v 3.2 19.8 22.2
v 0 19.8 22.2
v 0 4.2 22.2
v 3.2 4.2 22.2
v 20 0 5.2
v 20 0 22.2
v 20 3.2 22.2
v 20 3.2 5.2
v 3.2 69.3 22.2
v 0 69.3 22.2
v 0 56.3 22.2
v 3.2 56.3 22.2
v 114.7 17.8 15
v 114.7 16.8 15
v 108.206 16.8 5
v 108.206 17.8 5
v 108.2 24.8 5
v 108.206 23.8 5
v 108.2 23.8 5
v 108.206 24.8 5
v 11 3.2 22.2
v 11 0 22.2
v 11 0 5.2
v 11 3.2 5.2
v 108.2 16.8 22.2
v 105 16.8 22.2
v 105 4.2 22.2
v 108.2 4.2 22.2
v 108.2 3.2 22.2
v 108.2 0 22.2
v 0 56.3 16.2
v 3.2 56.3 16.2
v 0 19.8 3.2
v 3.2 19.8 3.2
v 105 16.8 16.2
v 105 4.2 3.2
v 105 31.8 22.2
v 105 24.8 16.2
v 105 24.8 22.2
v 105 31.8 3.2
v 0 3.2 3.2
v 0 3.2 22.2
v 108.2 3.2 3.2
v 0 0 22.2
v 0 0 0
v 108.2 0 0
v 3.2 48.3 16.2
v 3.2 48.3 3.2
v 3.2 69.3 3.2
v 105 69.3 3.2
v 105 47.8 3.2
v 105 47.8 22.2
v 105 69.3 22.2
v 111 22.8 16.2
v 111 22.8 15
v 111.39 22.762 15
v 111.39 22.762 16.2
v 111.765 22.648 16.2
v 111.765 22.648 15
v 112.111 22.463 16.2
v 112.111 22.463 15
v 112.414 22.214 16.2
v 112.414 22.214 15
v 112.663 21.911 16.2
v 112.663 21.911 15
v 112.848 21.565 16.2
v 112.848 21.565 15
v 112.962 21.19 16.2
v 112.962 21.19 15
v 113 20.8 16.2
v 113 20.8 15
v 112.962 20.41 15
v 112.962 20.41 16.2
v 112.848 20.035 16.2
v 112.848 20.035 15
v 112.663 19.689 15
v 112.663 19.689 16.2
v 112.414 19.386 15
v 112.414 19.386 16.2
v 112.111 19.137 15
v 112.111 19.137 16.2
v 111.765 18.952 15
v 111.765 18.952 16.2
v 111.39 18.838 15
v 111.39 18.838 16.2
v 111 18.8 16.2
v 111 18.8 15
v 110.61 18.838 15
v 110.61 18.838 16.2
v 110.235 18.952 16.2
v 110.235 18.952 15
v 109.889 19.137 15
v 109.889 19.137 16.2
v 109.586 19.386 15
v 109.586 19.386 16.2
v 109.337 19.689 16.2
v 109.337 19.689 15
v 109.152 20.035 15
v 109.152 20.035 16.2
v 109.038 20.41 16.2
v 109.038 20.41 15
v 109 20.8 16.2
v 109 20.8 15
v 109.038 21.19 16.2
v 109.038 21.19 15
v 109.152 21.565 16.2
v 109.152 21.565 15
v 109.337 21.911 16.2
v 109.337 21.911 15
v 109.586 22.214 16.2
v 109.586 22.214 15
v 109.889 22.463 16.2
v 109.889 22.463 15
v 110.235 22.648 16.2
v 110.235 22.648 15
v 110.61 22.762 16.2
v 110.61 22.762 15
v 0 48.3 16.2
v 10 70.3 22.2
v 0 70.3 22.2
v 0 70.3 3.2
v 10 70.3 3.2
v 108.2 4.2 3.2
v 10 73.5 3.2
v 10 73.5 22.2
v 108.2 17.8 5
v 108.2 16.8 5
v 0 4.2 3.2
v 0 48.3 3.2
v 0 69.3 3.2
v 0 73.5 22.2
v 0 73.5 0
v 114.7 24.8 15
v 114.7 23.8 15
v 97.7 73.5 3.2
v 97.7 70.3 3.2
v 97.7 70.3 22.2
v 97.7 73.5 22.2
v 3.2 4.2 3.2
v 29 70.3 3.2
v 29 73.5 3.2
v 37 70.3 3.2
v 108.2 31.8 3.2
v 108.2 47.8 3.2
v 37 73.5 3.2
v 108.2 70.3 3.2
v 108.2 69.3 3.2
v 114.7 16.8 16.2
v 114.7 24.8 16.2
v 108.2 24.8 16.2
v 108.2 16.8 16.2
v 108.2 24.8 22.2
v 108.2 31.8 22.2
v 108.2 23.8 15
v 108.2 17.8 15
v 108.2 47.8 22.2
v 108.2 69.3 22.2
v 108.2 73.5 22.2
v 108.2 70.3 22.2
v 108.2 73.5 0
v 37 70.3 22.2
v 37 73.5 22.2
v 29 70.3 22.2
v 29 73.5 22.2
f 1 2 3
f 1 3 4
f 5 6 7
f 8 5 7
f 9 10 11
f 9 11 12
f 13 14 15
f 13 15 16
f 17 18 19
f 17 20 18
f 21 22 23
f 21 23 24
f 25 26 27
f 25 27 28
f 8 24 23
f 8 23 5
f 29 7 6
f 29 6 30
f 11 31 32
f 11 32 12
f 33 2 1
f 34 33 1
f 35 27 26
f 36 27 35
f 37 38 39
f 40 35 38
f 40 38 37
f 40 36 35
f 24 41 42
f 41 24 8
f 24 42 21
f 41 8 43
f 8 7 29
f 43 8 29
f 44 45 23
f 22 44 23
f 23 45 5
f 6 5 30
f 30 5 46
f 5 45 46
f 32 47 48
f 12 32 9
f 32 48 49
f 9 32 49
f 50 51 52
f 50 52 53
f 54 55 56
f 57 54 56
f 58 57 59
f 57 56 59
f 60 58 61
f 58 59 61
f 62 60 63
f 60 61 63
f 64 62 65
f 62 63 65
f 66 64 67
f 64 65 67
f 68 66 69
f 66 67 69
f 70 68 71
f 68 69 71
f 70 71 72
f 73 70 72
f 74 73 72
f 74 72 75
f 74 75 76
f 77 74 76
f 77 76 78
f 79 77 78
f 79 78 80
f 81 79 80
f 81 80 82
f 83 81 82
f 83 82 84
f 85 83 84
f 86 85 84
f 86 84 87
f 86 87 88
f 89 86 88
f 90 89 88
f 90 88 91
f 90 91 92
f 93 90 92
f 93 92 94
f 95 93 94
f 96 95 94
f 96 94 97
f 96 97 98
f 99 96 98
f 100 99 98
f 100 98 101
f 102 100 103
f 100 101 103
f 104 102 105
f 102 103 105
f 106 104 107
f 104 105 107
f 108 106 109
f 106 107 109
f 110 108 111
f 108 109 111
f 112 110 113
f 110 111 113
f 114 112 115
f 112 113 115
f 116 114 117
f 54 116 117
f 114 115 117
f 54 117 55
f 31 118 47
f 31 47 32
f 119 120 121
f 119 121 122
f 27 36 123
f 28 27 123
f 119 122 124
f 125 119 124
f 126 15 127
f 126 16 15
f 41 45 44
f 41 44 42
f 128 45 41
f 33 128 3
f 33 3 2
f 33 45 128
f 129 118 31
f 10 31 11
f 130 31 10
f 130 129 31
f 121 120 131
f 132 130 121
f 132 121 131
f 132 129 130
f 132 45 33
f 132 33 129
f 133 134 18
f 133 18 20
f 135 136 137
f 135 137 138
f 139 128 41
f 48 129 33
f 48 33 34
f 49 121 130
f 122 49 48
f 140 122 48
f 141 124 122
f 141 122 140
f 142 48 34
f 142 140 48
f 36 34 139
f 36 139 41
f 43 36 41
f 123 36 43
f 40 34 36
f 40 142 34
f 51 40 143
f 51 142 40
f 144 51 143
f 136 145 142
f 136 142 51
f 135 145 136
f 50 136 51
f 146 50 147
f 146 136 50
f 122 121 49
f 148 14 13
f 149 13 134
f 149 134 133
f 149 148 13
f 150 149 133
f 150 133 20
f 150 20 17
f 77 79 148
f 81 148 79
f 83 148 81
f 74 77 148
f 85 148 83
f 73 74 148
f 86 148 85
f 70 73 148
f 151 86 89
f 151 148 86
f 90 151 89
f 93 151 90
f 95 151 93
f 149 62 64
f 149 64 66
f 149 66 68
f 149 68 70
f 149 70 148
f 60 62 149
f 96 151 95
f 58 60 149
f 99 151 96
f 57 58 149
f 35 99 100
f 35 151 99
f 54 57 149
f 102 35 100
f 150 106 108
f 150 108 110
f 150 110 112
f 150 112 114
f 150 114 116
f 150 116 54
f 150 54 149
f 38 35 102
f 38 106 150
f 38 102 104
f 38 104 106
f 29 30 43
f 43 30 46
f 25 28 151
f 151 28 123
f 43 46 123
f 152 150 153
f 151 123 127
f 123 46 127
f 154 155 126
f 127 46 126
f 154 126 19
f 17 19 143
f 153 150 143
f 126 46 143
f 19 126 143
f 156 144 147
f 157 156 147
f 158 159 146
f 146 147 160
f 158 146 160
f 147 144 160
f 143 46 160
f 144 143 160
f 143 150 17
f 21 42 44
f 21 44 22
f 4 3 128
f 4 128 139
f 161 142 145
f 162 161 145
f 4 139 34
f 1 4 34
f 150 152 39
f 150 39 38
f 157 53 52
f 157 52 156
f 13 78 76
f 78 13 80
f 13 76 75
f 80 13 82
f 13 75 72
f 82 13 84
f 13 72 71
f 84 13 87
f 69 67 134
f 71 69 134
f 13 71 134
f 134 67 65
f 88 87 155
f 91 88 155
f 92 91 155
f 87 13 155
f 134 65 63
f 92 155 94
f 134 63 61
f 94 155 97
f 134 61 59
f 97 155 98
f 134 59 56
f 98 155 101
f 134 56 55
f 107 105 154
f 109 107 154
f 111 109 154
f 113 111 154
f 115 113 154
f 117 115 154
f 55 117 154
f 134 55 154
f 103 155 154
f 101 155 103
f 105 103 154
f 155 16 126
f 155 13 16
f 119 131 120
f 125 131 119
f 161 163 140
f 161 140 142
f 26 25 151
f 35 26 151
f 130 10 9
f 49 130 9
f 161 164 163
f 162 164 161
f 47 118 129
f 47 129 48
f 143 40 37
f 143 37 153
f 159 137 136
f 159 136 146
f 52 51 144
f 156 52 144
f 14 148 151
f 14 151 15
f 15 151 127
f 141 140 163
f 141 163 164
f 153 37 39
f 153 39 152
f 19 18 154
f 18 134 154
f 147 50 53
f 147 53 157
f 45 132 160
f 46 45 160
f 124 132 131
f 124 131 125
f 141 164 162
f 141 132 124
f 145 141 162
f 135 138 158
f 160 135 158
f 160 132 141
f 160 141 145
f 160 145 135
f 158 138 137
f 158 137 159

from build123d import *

# Parameters (mm, degrees)
SKETCH1_W           = 108.2
SKETCH1_H           = 73.5
BOSS_EXTRUDE2_DEPTH = 3.2
SKETCH2_W           = 108.2
SKETCH2_H           = 73.5
SKETCH2_W_2         = 101.8
SKETCH2_H_2         = 67.1
BOSS_EXTRUDE3_DEPTH = 19
SKETCH3_W           = 3.2
SKETCH3_H           = 1
CUT_EXTRUDE1_DEPTH  = 19
SKETCH4_W           = 3.2
SKETCH4_H           = 28.5
CUT_EXTRUDE2_DEPTH  = 19
SKETCH5_W           = 19
SKETCH5_H           = 3.2
SKETCH5_W_2         = 60.7
CUT_EXTRUDE3_DEPTH  = 19
SKETCH6_W           = 3.2
SKETCH6_H           = 16
CUT_EXTRUDE4_DEPTH  = 19
SKETCH7_W           = 9
SKETCH7_H           = 3.2
CUT_EXTRUDE5_DEPTH  = 17
CUT_EXTRUDE6_REACH  = 134.674
SKETCH8_W           = 6
SKETCH8_H           = 8
CUT_EXTRUDE7_REACH  = 134.674
SKETCH9_W           = 6
SKETCH9_H           = 8
SKETCH10_W          = 1.2
SKETCH10_H          = 8
BOSS_EXTRUDE4_DEPTH = 6.5
CUT_EXTRUDE8_REACH  = 139.052
SKETCH11_R          = 2
SKETCH12_W          = 6.5
SKETCH12_H          = 1
BOSS_EXTRUDE5_DEPTH = 10
CHAMFER1_SIZE       = 10
CHAMFER1_SIZE2      = 6.494075932


with BuildPart() as part:
    # Sketch1 → Boss-Extrude2 (new body)
    with BuildSketch(Plane.XY):
        with Locations((54.1, 36.75)):
            Rectangle(SKETCH1_W, SKETCH1_H)
    extrude(amount=BOSS_EXTRUDE2_DEPTH)

    # Sketch2 → Boss-Extrude3 (add)
    with BuildSketch(Plane.XY.offset(3.2)):
        with Locations((54.1, 36.75)):
            Rectangle(SKETCH2_W, SKETCH2_H)
        with Locations((54.1, 36.75)):
            Rectangle(SKETCH2_W_2, SKETCH2_H_2, mode=Mode.SUBTRACT)
    extrude(amount=BOSS_EXTRUDE3_DEPTH)

    # Sketch3 → Cut-Extrude1 (cut)
    with BuildSketch(Plane.XY.offset(22.2)):
        with Locations((1.6, 69.8)):
            Rectangle(SKETCH3_W, SKETCH3_H)
        with Locations((106.6, 69.8)):
            Rectangle(SKETCH3_W, SKETCH3_H)
        with Locations((106.6, 3.7)):
            Rectangle(SKETCH3_W, SKETCH3_H)
        with Locations((1.6, 3.7)):
            Rectangle(SKETCH3_W, SKETCH3_H)
    extrude(amount=-CUT_EXTRUDE1_DEPTH, mode=Mode.SUBTRACT)

    # Sketch4 → Cut-Extrude2 (cut)
    with BuildSketch(Plane.XY.offset(22.2)):
        with Locations((1.6, 34.05)):
            Rectangle(SKETCH4_W, SKETCH4_H)
    extrude(amount=-CUT_EXTRUDE2_DEPTH, mode=Mode.SUBTRACT)

    # Sketch5 → Cut-Extrude3 (cut)
    with BuildSketch(Plane.XY.offset(22.2)):
        with Locations((19.5, 71.9)):
            Rectangle(SKETCH5_W, SKETCH5_H)
        with Locations((67.35, 71.9)):
            Rectangle(SKETCH5_W_2, SKETCH5_H)
    extrude(amount=-CUT_EXTRUDE3_DEPTH, mode=Mode.SUBTRACT)

    # Sketch6 → Cut-Extrude4 (cut)
    with BuildSketch(Plane.XY.offset(22.2)):
        with Locations((106.6, 39.8)):
            Rectangle(SKETCH6_W, SKETCH6_H)
    extrude(amount=-CUT_EXTRUDE4_DEPTH, mode=Mode.SUBTRACT)

    # Sketch7 → Cut-Extrude5 (cut)
    with BuildSketch(Plane.XY.offset(22.2)):
        with Locations((15.5, 1.6)):
            Rectangle(SKETCH7_W, SKETCH7_H)
    extrude(amount=-CUT_EXTRUDE5_DEPTH, mode=Mode.SUBTRACT)

    # Sketch8 → Cut-Extrude6 (cut, up to next)
    with BuildSketch(Plane.ZY, mode=Mode.PRIVATE) as cut_extrude6_sk1:
        with Locations((19.2, 52.3)):
            Rectangle(SKETCH8_W, SKETCH8_H)
    cut_extrude6_tool1 = extrude(cut_extrude6_sk1.sketch, amount=-CUT_EXTRUDE6_REACH, mode=Mode.PRIVATE) & part.part
    add(cut_extrude6_tool1.solids().sort_by_distance((0, 52.3, 19.2))[0], mode=Mode.SUBTRACT)

    # Sketch9 → Cut-Extrude7 (cut, up to next)
    with BuildSketch(Plane(origin=(108.2, 0, 0), x_dir=(0, 0, -1), z_dir=(1, 0, 0)), mode=Mode.PRIVATE) as cut_extrude7_sk1:
        with Locations((-19.2, 20.8)):
            Rectangle(SKETCH9_W, SKETCH9_H)
    cut_extrude7_tool1 = extrude(cut_extrude7_sk1.sketch, amount=-CUT_EXTRUDE7_REACH, mode=Mode.PRIVATE) & part.part
    add(cut_extrude7_tool1.solids().sort_by_distance((108.2, 20.8, 19.2))[0], mode=Mode.SUBTRACT)

    # Sketch10 → Boss-Extrude4 (add)
    with BuildSketch(Plane(origin=(108.2, 0, 0), x_dir=(0, 0, -1), z_dir=(1, 0, 0))):
        with Locations((-15.6, 20.8)):
            Rectangle(SKETCH10_W, SKETCH10_H)
    extrude(amount=BOSS_EXTRUDE4_DEPTH)

    # Sketch11 → Cut-Extrude8 (cut, up to next)
    with BuildSketch(Plane(origin=(0, 0, 15), x_dir=(-1, 0, 0), z_dir=(0, 0, -1)), mode=Mode.PRIVATE) as cut_extrude8_sk1:
        with Locations(Location((-111, 20.8, 0), (0, 0, 90))):
            Circle(SKETCH11_R)
    cut_extrude8_tool1 = extrude(cut_extrude8_sk1.sketch, amount=-CUT_EXTRUDE8_REACH, mode=Mode.PRIVATE) & part.part
    add(cut_extrude8_tool1.solids().sort_by_distance((111, 20.8, 15))[0], mode=Mode.SUBTRACT)

    # Sketch12 → Boss-Extrude5 (add)
    with BuildSketch(Plane(origin=(0, 0, 15), x_dir=(-1, 0, 0), z_dir=(0, 0, -1))):
        with Locations((-111.45, 24.3)):
            Rectangle(SKETCH12_W, SKETCH12_H)
        with Locations((-111.45, 17.3)):
            Rectangle(SKETCH12_W, SKETCH12_H)
    extrude(amount=BOSS_EXTRUDE5_DEPTH)

    # Chamfer1
    chamfer1_edges = [part.edges().sort_by_distance(p)[0] for p in [
        (114.7, 17.3, 5),
        (114.7, 24.3, 5),
    ]]
    chamfer1_side = [part.faces().sort_by_distance(p)[0] for p in [
        (114.7, 20.8, 16.062362796),
    ]]
    chamfer(chamfer1_edges, length=CHAMFER1_SIZE, length2=CHAMFER1_SIZE2, reference=chamfer1_side[0])


solid = part.part
